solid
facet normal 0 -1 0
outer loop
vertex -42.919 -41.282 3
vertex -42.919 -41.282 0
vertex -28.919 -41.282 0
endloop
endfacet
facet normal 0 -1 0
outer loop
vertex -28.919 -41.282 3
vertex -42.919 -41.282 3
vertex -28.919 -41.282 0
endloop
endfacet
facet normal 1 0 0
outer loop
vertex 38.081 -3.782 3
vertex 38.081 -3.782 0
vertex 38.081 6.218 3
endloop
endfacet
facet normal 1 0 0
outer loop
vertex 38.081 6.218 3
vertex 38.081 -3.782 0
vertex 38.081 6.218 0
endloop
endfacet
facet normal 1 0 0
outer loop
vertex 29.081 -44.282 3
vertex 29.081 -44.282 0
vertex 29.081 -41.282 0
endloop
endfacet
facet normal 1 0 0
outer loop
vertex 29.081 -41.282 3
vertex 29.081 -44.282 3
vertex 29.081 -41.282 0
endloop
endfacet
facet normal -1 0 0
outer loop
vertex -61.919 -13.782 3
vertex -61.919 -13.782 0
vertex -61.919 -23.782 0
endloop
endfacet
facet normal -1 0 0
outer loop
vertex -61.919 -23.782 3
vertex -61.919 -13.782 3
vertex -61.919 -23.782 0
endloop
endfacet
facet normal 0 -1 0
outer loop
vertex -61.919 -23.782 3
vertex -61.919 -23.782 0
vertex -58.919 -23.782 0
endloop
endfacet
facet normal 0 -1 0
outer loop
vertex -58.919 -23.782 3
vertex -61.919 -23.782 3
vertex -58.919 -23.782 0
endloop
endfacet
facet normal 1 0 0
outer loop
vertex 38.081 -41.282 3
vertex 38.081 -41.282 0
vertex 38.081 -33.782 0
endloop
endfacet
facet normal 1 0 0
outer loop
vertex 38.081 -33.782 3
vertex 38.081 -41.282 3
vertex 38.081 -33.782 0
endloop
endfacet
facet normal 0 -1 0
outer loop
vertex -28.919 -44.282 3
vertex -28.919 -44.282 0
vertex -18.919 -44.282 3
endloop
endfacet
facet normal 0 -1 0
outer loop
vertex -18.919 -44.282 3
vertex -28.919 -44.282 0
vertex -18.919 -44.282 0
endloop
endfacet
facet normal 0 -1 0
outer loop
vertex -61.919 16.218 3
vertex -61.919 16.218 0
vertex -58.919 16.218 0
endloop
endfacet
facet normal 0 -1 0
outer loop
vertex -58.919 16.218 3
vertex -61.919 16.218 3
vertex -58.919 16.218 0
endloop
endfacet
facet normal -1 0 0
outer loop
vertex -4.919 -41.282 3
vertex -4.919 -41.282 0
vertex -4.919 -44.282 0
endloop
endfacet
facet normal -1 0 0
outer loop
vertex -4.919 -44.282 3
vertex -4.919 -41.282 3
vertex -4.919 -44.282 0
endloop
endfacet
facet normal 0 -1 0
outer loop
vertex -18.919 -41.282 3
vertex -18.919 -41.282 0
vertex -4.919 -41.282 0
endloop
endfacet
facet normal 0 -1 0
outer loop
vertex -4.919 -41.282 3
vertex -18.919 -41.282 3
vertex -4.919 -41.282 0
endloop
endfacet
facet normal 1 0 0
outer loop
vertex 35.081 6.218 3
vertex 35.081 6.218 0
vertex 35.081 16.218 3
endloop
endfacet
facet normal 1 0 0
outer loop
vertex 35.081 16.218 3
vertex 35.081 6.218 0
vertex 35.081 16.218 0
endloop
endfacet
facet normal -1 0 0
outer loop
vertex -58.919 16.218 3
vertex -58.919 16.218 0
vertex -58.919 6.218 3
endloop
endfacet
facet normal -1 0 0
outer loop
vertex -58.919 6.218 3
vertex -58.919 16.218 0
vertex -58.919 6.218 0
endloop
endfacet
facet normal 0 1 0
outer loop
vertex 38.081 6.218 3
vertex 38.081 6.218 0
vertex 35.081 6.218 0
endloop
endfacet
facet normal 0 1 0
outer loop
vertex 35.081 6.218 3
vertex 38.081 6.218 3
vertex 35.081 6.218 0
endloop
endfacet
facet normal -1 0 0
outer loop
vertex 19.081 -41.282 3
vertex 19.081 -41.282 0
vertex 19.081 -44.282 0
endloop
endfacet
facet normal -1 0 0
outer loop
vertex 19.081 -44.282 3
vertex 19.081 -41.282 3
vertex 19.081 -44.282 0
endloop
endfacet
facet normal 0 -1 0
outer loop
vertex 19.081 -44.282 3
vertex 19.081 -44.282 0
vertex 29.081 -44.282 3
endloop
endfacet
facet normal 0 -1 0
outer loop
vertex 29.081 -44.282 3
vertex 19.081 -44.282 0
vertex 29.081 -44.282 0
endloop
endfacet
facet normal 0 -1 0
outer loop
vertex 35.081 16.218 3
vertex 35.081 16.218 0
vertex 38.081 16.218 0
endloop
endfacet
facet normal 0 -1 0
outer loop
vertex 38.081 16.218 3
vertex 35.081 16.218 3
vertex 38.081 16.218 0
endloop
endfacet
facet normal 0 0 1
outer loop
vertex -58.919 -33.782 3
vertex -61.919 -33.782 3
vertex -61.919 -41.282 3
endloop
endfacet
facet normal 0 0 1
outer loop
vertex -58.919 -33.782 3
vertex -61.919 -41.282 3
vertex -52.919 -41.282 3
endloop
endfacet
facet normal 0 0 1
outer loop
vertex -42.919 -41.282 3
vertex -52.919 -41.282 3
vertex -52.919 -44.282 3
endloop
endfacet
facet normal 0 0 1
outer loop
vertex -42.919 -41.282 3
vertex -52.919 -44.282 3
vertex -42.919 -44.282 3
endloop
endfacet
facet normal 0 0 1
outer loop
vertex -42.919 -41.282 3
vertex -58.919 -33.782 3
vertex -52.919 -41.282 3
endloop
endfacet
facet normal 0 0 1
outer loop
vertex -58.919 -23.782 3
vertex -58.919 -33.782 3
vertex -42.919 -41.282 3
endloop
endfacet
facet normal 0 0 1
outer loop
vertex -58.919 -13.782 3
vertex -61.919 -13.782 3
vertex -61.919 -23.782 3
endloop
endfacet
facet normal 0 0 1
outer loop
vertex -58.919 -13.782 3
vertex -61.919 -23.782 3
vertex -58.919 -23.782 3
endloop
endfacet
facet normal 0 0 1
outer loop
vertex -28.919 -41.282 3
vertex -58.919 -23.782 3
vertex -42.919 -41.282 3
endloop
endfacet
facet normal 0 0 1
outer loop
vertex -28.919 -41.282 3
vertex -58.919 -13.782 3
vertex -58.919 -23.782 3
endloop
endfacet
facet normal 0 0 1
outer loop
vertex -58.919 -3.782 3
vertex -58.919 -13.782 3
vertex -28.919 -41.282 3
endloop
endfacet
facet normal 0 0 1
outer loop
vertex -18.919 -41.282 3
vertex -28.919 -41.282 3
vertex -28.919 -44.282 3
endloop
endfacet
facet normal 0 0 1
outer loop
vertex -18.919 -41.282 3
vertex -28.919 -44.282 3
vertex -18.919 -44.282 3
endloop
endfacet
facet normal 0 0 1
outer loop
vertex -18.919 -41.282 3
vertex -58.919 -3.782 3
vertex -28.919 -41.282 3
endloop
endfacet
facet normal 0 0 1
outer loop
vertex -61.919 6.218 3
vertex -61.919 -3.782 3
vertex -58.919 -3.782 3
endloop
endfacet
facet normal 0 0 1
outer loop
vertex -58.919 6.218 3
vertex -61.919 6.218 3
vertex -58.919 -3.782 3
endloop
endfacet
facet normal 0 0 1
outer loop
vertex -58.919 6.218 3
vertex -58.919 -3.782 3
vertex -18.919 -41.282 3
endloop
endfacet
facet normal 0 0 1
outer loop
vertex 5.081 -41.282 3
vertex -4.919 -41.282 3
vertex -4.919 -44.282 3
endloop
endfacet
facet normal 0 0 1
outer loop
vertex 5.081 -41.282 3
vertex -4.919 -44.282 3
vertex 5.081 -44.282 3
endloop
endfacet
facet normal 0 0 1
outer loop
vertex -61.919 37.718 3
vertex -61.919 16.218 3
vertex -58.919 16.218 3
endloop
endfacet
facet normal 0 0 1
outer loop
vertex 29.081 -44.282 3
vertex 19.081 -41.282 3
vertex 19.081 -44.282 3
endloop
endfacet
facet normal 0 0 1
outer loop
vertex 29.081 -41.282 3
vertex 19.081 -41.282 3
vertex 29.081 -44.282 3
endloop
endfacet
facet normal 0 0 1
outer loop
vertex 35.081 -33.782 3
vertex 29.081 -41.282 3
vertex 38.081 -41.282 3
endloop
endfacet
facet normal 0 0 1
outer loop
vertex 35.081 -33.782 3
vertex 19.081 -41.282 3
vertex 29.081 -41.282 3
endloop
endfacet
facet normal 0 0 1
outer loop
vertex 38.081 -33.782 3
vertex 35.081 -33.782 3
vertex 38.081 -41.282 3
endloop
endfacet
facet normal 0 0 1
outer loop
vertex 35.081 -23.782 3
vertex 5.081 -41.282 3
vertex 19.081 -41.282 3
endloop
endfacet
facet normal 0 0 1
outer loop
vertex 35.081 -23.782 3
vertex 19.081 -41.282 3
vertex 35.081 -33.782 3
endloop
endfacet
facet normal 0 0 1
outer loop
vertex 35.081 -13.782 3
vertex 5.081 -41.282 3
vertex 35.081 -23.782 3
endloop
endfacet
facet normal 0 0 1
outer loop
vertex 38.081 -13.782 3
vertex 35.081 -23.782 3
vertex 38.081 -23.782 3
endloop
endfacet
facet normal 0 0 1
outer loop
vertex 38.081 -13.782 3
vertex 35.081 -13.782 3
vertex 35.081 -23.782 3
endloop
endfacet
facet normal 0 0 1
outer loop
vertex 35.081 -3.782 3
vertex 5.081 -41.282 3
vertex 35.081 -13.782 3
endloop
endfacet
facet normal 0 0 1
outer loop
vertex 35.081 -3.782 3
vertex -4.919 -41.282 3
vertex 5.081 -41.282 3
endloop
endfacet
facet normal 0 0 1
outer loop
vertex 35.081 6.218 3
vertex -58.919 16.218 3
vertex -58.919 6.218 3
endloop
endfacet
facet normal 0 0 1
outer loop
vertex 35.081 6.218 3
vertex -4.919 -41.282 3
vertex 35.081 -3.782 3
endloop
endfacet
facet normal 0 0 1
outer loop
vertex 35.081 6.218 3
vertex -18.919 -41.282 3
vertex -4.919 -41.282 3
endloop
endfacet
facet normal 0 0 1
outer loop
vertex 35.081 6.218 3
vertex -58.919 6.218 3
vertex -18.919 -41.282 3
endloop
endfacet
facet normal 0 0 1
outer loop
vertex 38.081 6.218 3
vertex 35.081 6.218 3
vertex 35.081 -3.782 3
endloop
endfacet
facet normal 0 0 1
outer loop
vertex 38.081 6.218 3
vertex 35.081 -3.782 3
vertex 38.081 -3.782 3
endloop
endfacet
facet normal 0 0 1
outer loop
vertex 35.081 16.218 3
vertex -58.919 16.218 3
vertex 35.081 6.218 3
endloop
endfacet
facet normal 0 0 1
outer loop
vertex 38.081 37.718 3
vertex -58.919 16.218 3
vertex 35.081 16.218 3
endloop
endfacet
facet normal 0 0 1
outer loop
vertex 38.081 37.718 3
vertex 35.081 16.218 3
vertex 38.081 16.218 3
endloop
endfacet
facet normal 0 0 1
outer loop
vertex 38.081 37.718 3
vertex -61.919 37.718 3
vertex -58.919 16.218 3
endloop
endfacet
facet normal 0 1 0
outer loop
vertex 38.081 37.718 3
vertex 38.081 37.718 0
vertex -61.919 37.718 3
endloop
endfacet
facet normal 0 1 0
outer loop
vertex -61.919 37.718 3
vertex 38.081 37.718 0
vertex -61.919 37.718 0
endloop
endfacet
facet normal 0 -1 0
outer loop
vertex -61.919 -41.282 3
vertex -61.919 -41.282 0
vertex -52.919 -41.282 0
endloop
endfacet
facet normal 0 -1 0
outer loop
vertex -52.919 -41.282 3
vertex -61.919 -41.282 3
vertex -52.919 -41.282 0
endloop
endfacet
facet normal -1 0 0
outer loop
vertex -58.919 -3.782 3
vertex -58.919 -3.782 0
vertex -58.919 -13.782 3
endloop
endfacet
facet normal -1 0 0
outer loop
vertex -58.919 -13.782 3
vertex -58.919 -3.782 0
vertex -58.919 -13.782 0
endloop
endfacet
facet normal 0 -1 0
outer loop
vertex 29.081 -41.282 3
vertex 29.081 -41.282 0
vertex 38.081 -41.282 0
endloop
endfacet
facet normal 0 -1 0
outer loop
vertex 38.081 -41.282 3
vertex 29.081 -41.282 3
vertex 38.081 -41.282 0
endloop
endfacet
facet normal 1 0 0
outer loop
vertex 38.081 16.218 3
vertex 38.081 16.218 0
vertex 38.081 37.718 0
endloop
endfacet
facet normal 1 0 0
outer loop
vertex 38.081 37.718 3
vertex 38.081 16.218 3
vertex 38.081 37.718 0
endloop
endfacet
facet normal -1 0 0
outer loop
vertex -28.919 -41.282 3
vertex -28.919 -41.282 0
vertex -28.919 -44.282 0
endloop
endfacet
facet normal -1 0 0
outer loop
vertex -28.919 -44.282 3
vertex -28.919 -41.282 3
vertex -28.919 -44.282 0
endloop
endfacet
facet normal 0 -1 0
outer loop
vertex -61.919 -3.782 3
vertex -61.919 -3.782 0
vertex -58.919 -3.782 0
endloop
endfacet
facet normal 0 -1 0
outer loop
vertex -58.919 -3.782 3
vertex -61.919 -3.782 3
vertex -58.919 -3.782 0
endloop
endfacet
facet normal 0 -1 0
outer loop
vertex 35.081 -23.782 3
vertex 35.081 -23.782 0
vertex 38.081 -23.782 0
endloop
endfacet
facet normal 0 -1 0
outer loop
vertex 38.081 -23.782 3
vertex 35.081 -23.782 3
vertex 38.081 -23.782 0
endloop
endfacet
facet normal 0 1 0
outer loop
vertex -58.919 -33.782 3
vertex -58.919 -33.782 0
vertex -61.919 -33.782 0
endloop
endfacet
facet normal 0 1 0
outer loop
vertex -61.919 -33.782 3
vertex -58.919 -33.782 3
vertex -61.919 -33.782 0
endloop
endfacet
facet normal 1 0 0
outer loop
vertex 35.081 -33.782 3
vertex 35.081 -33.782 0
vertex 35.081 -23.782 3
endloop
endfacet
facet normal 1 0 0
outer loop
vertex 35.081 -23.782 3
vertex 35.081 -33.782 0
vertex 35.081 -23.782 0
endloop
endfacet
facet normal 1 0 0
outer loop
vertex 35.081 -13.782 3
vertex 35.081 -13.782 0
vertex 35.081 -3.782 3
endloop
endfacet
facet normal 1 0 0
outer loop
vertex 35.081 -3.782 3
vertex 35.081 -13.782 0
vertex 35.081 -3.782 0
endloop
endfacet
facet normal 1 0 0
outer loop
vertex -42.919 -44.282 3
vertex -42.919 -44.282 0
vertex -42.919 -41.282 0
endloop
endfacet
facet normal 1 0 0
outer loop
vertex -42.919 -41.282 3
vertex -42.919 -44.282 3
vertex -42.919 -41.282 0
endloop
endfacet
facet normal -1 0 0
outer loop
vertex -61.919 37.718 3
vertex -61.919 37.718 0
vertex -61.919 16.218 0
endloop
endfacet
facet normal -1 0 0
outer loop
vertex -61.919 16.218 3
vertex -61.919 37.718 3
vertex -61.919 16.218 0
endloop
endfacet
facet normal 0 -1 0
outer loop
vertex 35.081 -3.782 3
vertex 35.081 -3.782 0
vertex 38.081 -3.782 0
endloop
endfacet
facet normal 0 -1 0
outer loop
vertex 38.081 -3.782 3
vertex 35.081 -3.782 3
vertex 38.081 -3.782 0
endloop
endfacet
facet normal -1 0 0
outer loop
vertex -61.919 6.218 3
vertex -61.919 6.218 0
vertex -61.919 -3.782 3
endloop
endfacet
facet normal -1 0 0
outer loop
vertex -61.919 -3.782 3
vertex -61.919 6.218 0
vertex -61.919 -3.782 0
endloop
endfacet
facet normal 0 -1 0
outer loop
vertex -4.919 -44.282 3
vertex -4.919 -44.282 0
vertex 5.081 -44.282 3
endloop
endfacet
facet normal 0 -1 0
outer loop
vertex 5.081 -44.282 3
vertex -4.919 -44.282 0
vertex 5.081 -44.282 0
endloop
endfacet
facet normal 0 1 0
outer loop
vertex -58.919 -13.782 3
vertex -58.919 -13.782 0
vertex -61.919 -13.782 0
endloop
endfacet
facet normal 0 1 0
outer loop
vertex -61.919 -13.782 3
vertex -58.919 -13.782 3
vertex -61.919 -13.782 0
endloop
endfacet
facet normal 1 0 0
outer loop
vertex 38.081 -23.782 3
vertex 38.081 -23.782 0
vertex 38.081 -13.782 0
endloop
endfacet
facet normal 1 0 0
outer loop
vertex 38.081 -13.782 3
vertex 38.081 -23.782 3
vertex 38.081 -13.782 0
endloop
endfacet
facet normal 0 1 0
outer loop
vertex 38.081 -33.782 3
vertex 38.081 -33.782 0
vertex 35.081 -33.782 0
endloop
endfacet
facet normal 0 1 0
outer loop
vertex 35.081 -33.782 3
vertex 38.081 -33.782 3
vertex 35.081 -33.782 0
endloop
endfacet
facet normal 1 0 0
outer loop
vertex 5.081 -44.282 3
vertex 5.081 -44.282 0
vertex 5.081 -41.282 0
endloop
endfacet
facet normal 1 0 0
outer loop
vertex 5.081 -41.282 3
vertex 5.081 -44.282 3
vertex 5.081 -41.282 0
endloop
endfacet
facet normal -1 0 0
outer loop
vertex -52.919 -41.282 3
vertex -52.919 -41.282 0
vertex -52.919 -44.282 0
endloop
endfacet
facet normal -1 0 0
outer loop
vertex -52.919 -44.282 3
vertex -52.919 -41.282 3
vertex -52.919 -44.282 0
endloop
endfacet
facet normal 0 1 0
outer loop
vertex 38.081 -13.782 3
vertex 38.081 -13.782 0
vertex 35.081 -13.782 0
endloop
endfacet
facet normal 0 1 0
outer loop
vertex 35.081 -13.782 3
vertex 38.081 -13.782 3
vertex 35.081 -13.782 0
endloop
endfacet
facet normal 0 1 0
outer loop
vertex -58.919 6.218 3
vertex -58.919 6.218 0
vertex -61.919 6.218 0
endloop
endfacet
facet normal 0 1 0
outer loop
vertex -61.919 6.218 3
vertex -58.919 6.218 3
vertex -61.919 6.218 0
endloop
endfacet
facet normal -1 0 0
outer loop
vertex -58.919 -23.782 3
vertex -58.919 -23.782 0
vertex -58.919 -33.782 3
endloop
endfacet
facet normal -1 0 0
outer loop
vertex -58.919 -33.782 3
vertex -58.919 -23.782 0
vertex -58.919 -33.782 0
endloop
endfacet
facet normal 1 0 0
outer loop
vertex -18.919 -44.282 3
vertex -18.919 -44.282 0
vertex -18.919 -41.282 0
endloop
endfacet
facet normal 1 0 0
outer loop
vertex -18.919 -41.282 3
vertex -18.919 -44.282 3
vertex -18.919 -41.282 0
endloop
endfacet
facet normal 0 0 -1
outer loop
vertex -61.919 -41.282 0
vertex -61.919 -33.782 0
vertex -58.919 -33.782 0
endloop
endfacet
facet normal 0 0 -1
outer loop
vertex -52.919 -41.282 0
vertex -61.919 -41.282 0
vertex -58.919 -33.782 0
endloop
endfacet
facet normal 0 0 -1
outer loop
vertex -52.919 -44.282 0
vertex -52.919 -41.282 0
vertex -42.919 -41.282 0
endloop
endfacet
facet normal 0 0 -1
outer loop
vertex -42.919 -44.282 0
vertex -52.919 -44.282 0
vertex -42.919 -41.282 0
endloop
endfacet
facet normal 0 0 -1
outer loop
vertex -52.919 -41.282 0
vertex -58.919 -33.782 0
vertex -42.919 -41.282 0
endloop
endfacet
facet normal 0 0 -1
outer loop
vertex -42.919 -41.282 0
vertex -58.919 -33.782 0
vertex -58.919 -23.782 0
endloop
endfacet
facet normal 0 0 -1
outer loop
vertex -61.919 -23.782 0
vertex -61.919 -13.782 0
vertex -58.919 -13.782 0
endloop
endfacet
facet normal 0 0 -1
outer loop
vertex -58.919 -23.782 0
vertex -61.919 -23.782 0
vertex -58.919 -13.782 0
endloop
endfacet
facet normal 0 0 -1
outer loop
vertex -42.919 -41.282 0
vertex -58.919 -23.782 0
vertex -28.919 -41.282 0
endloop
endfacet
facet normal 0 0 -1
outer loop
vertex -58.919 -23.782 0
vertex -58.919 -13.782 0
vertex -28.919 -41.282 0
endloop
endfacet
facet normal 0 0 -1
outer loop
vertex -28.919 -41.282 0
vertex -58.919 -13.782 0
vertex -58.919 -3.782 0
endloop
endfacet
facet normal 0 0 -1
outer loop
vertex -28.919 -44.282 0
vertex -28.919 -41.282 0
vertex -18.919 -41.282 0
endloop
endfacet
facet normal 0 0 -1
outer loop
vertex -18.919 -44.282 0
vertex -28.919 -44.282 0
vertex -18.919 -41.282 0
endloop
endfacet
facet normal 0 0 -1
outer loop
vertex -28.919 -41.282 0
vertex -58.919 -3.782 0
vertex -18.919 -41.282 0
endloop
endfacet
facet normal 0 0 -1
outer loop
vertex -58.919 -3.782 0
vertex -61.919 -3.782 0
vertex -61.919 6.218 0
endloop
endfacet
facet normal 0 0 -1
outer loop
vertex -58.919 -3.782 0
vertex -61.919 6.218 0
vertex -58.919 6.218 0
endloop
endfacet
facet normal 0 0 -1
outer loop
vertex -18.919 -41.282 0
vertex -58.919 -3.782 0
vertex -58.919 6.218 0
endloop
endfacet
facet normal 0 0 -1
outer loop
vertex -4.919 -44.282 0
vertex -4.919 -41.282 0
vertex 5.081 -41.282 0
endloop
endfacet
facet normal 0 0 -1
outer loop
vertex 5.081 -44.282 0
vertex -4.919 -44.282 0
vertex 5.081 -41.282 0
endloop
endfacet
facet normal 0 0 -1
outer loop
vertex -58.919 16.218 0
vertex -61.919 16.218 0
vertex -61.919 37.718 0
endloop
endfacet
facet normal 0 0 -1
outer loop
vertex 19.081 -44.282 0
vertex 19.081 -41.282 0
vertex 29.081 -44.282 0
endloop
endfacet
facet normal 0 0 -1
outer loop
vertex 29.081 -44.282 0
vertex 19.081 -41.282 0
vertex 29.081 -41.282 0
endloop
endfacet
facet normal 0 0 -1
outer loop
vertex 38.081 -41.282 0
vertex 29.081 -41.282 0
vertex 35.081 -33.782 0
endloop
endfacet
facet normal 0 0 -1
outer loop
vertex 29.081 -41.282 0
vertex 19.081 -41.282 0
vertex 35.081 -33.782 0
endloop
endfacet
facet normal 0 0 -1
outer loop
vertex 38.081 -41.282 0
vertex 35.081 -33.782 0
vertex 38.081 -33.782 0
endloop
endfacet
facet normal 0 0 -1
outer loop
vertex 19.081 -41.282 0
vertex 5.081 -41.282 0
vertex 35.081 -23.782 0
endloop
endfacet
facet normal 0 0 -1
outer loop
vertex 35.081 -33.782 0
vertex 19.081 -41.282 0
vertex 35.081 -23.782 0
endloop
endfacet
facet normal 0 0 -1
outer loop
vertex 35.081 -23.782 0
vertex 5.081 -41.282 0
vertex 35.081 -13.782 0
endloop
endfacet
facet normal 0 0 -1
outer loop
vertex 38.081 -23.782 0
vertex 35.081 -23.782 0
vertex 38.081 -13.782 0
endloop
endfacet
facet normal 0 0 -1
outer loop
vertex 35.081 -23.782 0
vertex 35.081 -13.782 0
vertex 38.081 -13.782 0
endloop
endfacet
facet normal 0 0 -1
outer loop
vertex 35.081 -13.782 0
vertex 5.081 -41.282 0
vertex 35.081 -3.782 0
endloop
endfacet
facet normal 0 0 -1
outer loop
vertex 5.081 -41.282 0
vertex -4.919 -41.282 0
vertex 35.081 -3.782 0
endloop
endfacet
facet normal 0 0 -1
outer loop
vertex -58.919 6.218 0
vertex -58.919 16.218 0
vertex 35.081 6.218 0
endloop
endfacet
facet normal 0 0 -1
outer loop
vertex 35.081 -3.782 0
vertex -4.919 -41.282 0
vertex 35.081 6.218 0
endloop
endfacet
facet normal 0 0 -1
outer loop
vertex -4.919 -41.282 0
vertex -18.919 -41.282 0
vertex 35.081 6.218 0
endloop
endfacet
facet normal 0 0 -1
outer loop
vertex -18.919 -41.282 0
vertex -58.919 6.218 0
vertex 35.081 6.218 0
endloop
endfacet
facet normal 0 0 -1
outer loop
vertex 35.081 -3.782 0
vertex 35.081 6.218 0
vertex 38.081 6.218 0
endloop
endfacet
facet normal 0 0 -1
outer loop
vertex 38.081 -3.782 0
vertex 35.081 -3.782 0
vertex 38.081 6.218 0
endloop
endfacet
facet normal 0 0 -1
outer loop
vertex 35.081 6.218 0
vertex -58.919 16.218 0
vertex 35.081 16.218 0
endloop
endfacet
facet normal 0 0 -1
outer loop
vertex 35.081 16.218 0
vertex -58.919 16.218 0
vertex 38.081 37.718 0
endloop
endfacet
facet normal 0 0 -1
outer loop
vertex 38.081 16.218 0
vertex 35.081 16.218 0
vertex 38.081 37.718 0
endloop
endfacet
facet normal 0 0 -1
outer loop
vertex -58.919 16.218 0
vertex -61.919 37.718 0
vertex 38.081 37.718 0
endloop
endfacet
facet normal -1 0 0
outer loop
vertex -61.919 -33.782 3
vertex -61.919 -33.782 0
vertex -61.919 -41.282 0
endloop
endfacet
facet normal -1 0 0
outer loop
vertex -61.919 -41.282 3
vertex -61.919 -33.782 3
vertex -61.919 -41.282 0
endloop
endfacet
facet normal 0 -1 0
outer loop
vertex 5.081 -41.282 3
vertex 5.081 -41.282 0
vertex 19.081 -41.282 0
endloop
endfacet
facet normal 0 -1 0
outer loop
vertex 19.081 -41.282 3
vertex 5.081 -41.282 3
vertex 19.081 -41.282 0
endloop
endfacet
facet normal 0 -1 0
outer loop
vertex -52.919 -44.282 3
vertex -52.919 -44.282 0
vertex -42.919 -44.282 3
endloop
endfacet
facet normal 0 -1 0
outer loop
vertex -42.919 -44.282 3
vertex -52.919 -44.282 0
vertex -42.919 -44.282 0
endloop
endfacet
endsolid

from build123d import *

# Parameters (mm, degrees)
SKETCH_1_W      = 10
SKETCH_1_H      = 3
EXTRUDE_1_DEPTH = 3


with BuildPart() as part:
    # 草圖1 → 填料-伸長1 (new body)
    with BuildSketch(Plane.XY):
        Polygon((29.080711207, 23.718072979), (38.080711207, 23.718072979), (38.080711207, 37.718072979), (-61.919288793, 37.718072979), (-61.919288793, 23.718072979), (-52.919288793, 23.718072979), (-52.919288793, 26.718072979), (-42.919288793, 26.718072979), (-42.919288793, 23.718072979), (-28.919288793, 23.718072979), (-28.919288793, 26.718072979), (-18.919288793, 26.718072979), (-18.919288793, 23.718072979), (-4.919288793, 23.718072979), (-4.919288793, 26.718072979), (5.080711207, 26.718072979), (5.080711207, 23.718072979), (19.080711207, 23.718072979), (19.080711207, 26.718072979), (29.080711207, 26.718072979), align=None)
        with Locations((-47.919288793, 25.218072979)):
            Rectangle(SKETCH_1_W, SKETCH_1_H)
        with Locations((-23.919288793, 25.218072979)):
            Rectangle(SKETCH_1_W, SKETCH_1_H)
        with Locations((0.080711207, 25.218072979)):
            Rectangle(SKETCH_1_W, SKETCH_1_H)
        with Locations((24.080711207, 25.218072979)):
            Rectangle(SKETCH_1_W, SKETCH_1_H)
        Polygon((-52.919288793, 23.718072979), (-61.919288793, 23.718072979), (-61.919288793, 16.218072979), (-58.919288793, 16.218072979), (-58.919288793, 6.218072979), (-61.919288793, 6.218072979), (-61.919288793, -3.781927021), (-58.919288793, -3.781927021), (-58.919288793, -13.781927021), (-61.919288793, -13.781927021), (-61.919288793, -23.781927021), (-58.919288793, -23.781927021), (-58.919288793, -33.781927021), (-61.919288793, -33.781927021), (-61.919288793, -41.281927021), (-52.919288793, -41.281927021), (-52.919288793, -44.281927021), (-42.919288793, -44.281927021), (-42.919288793, -41.281927021), (-28.919288793, -41.281927021), (-28.919288793, -44.281927021), (-18.919288793, -44.281927021), (-18.919288793, -41.281927021), (-4.919288793, -41.281927021), (-4.919288793, -44.281927021), (5.080711207, -44.281927021), (5.080711207, -41.281927021), (19.080711207, -41.281927021), (19.080711207, -44.281927021), (29.080711207, -44.281927021), (29.080711207, -41.281927021), (38.080711207, -41.281927021), (38.080711207, -33.781927021), (35.080711207, -33.781927021), (35.080711207, -23.781927021), (38.080711207, -23.781927021), (38.080711207, -13.781927021), (35.080711207, -13.781927021), (35.080711207, -3.781927021), (38.080711207, -3.781927021), (38.080711207, 6.218072979), (35.080711207, 6.218072979), (35.080711207, 16.218072979), (38.080711207, 16.218072979), (38.080711207, 23.718072979), (29.080711207, 23.718072979), (19.080711207, 23.718072979), (5.080711207, 23.718072979), (-4.919288793, 23.718072979), (-18.919288793, 23.718072979), (-28.919288793, 23.718072979), (-42.919288793, 23.718072979), align=None)
    extrude(amount=EXTRUDE_1_DEPTH)


solid = part.part
